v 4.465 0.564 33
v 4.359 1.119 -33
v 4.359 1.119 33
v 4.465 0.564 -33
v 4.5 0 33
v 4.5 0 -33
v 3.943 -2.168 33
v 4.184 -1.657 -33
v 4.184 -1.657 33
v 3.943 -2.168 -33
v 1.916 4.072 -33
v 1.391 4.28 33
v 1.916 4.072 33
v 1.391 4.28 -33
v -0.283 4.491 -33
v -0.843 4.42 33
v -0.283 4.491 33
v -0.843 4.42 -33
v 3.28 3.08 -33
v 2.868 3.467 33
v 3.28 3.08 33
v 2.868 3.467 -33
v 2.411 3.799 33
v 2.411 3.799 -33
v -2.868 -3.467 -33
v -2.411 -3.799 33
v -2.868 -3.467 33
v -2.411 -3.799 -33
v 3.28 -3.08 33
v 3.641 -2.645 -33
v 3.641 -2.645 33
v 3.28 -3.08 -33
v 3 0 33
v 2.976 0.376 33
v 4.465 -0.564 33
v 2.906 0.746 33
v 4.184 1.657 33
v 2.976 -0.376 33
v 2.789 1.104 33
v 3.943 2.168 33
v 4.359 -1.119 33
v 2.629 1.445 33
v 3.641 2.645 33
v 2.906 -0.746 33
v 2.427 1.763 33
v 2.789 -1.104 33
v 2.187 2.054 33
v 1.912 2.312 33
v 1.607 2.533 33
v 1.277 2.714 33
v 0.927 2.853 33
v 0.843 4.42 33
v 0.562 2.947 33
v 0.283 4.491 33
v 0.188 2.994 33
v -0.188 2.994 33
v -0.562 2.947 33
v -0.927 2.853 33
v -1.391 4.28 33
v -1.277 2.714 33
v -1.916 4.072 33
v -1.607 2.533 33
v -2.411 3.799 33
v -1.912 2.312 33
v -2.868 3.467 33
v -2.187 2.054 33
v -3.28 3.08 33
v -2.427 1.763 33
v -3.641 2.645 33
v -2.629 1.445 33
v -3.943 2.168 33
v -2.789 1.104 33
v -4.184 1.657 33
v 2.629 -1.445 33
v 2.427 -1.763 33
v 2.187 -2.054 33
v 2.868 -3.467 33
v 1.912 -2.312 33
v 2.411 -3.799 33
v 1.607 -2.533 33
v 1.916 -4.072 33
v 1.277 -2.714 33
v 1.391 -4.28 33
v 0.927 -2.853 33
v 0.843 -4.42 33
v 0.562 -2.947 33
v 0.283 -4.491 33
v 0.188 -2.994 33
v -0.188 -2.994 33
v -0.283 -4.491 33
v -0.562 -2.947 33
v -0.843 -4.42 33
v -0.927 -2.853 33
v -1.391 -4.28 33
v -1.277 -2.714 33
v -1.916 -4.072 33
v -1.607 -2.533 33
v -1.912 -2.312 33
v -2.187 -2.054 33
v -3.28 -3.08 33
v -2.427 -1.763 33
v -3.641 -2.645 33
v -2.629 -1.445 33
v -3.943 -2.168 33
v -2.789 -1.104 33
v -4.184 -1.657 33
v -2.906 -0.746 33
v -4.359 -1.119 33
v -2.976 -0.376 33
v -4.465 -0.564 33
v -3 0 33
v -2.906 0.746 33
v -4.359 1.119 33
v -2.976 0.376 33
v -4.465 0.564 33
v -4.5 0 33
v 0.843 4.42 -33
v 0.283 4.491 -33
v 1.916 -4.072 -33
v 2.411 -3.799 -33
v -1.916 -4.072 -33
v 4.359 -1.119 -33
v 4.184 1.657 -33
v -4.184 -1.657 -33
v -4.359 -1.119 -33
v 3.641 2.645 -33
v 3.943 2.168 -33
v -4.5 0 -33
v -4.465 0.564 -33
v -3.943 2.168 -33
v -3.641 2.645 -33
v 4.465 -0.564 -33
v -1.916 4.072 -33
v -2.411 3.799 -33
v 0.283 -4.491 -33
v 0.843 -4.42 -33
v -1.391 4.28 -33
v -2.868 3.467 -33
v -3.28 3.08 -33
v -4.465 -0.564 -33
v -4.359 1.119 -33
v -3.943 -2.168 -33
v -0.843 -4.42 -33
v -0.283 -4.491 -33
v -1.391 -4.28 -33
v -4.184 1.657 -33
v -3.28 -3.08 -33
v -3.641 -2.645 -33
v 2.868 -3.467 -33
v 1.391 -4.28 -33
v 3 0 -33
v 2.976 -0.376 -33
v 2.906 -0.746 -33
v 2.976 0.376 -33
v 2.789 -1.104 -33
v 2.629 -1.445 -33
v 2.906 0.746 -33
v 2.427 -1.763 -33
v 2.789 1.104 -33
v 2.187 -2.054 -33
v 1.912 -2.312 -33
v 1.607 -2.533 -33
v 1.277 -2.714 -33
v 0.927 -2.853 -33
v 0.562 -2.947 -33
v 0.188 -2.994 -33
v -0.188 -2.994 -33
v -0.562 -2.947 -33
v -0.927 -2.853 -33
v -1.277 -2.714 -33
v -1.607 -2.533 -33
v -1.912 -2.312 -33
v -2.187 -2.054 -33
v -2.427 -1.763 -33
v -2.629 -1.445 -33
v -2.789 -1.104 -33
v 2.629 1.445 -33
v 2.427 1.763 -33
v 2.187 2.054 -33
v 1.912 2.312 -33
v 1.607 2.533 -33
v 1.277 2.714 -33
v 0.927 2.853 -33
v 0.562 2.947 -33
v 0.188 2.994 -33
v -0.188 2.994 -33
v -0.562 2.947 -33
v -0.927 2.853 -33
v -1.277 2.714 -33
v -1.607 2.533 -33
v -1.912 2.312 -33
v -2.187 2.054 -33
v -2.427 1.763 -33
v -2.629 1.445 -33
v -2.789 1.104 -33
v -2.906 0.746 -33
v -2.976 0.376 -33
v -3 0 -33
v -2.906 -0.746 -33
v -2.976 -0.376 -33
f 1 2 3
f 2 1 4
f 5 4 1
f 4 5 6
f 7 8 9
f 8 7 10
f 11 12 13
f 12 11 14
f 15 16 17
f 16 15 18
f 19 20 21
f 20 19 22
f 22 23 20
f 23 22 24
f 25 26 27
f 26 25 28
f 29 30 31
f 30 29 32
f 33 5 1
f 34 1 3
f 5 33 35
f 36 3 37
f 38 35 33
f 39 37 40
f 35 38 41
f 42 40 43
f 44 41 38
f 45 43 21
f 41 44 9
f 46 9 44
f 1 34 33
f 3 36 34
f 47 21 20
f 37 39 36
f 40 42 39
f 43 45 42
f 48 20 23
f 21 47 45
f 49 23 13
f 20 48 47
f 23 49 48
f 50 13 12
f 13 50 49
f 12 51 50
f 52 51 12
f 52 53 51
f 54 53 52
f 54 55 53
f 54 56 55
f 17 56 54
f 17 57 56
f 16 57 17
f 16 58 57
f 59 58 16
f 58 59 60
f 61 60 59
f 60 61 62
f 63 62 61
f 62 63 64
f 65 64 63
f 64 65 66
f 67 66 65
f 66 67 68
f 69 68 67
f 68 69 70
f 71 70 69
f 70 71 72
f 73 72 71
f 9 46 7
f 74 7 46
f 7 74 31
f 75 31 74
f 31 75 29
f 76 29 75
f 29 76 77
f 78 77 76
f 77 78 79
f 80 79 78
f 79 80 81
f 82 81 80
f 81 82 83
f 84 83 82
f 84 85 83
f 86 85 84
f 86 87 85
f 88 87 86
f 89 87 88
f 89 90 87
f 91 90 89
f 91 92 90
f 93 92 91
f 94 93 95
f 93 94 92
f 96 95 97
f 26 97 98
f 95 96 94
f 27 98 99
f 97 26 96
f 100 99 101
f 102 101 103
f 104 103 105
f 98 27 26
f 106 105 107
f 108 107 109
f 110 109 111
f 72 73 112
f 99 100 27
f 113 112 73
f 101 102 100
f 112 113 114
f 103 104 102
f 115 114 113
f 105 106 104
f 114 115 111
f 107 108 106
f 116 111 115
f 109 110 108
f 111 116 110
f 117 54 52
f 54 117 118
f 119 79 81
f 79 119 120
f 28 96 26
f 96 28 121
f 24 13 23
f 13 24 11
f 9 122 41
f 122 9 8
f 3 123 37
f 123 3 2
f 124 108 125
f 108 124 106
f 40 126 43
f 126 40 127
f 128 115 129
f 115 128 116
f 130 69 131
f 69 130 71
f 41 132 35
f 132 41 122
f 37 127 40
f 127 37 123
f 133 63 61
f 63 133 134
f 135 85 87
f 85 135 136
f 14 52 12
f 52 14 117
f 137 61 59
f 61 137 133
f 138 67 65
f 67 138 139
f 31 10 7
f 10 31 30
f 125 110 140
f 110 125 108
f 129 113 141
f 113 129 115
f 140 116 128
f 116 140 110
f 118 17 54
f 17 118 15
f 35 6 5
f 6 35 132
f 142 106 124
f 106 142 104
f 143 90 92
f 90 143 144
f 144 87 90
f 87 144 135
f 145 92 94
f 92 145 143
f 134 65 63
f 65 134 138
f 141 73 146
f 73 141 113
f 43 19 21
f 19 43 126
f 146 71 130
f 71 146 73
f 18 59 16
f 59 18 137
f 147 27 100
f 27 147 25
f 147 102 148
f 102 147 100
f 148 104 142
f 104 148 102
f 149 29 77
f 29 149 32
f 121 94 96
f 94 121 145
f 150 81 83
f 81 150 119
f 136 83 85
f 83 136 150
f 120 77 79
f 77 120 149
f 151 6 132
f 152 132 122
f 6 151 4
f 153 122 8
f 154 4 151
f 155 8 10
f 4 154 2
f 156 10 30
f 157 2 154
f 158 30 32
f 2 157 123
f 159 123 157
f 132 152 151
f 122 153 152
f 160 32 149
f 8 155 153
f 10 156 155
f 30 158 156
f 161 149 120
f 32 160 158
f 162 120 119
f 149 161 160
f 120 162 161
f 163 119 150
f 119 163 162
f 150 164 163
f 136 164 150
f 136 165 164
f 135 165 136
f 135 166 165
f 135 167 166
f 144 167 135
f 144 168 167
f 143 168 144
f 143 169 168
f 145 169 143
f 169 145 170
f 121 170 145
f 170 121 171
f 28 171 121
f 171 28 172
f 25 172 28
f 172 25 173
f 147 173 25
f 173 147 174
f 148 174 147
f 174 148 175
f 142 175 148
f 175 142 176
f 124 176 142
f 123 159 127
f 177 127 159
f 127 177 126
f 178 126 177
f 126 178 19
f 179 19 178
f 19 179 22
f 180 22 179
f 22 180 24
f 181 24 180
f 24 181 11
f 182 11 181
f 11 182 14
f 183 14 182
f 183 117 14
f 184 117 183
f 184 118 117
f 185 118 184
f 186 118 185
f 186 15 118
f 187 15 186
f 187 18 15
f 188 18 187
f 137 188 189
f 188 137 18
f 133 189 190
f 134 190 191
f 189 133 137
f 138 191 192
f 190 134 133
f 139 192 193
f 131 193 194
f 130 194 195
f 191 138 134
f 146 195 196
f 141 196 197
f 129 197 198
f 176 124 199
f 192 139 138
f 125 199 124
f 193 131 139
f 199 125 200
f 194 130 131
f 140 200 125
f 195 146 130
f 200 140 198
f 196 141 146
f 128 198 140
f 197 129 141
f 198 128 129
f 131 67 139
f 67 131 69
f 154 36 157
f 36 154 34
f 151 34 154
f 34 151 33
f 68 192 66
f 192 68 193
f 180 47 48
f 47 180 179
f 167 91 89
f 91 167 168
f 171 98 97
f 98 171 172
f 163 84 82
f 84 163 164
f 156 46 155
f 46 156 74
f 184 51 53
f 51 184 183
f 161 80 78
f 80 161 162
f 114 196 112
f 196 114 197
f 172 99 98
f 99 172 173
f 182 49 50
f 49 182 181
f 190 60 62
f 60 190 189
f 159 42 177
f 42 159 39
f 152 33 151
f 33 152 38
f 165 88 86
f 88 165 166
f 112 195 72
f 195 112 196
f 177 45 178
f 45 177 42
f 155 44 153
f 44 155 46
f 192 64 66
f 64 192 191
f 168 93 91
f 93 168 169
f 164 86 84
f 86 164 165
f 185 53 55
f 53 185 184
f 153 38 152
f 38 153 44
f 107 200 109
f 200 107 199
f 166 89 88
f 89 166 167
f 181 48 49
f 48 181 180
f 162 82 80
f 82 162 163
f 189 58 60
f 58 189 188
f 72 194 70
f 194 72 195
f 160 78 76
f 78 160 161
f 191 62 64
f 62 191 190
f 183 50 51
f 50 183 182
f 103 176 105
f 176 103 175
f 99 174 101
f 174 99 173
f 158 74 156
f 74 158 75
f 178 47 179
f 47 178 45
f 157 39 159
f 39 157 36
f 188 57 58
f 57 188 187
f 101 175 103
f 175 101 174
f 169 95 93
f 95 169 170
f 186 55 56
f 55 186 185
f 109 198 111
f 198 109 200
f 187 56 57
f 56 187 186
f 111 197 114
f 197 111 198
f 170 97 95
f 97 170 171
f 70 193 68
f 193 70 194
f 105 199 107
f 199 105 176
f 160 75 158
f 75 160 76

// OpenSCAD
$fn = 50;


difference() {
	union() {
		translate(v = [0, 0, -33.0000000000]) {
			cylinder(h = 66, r = 4.5000000000);
		}
	}
	union() {
		translate(v = [0, 0, -100.0000000000]) {
			cylinder(h = 200, r = 3.0000000000);
		}
	}
}
